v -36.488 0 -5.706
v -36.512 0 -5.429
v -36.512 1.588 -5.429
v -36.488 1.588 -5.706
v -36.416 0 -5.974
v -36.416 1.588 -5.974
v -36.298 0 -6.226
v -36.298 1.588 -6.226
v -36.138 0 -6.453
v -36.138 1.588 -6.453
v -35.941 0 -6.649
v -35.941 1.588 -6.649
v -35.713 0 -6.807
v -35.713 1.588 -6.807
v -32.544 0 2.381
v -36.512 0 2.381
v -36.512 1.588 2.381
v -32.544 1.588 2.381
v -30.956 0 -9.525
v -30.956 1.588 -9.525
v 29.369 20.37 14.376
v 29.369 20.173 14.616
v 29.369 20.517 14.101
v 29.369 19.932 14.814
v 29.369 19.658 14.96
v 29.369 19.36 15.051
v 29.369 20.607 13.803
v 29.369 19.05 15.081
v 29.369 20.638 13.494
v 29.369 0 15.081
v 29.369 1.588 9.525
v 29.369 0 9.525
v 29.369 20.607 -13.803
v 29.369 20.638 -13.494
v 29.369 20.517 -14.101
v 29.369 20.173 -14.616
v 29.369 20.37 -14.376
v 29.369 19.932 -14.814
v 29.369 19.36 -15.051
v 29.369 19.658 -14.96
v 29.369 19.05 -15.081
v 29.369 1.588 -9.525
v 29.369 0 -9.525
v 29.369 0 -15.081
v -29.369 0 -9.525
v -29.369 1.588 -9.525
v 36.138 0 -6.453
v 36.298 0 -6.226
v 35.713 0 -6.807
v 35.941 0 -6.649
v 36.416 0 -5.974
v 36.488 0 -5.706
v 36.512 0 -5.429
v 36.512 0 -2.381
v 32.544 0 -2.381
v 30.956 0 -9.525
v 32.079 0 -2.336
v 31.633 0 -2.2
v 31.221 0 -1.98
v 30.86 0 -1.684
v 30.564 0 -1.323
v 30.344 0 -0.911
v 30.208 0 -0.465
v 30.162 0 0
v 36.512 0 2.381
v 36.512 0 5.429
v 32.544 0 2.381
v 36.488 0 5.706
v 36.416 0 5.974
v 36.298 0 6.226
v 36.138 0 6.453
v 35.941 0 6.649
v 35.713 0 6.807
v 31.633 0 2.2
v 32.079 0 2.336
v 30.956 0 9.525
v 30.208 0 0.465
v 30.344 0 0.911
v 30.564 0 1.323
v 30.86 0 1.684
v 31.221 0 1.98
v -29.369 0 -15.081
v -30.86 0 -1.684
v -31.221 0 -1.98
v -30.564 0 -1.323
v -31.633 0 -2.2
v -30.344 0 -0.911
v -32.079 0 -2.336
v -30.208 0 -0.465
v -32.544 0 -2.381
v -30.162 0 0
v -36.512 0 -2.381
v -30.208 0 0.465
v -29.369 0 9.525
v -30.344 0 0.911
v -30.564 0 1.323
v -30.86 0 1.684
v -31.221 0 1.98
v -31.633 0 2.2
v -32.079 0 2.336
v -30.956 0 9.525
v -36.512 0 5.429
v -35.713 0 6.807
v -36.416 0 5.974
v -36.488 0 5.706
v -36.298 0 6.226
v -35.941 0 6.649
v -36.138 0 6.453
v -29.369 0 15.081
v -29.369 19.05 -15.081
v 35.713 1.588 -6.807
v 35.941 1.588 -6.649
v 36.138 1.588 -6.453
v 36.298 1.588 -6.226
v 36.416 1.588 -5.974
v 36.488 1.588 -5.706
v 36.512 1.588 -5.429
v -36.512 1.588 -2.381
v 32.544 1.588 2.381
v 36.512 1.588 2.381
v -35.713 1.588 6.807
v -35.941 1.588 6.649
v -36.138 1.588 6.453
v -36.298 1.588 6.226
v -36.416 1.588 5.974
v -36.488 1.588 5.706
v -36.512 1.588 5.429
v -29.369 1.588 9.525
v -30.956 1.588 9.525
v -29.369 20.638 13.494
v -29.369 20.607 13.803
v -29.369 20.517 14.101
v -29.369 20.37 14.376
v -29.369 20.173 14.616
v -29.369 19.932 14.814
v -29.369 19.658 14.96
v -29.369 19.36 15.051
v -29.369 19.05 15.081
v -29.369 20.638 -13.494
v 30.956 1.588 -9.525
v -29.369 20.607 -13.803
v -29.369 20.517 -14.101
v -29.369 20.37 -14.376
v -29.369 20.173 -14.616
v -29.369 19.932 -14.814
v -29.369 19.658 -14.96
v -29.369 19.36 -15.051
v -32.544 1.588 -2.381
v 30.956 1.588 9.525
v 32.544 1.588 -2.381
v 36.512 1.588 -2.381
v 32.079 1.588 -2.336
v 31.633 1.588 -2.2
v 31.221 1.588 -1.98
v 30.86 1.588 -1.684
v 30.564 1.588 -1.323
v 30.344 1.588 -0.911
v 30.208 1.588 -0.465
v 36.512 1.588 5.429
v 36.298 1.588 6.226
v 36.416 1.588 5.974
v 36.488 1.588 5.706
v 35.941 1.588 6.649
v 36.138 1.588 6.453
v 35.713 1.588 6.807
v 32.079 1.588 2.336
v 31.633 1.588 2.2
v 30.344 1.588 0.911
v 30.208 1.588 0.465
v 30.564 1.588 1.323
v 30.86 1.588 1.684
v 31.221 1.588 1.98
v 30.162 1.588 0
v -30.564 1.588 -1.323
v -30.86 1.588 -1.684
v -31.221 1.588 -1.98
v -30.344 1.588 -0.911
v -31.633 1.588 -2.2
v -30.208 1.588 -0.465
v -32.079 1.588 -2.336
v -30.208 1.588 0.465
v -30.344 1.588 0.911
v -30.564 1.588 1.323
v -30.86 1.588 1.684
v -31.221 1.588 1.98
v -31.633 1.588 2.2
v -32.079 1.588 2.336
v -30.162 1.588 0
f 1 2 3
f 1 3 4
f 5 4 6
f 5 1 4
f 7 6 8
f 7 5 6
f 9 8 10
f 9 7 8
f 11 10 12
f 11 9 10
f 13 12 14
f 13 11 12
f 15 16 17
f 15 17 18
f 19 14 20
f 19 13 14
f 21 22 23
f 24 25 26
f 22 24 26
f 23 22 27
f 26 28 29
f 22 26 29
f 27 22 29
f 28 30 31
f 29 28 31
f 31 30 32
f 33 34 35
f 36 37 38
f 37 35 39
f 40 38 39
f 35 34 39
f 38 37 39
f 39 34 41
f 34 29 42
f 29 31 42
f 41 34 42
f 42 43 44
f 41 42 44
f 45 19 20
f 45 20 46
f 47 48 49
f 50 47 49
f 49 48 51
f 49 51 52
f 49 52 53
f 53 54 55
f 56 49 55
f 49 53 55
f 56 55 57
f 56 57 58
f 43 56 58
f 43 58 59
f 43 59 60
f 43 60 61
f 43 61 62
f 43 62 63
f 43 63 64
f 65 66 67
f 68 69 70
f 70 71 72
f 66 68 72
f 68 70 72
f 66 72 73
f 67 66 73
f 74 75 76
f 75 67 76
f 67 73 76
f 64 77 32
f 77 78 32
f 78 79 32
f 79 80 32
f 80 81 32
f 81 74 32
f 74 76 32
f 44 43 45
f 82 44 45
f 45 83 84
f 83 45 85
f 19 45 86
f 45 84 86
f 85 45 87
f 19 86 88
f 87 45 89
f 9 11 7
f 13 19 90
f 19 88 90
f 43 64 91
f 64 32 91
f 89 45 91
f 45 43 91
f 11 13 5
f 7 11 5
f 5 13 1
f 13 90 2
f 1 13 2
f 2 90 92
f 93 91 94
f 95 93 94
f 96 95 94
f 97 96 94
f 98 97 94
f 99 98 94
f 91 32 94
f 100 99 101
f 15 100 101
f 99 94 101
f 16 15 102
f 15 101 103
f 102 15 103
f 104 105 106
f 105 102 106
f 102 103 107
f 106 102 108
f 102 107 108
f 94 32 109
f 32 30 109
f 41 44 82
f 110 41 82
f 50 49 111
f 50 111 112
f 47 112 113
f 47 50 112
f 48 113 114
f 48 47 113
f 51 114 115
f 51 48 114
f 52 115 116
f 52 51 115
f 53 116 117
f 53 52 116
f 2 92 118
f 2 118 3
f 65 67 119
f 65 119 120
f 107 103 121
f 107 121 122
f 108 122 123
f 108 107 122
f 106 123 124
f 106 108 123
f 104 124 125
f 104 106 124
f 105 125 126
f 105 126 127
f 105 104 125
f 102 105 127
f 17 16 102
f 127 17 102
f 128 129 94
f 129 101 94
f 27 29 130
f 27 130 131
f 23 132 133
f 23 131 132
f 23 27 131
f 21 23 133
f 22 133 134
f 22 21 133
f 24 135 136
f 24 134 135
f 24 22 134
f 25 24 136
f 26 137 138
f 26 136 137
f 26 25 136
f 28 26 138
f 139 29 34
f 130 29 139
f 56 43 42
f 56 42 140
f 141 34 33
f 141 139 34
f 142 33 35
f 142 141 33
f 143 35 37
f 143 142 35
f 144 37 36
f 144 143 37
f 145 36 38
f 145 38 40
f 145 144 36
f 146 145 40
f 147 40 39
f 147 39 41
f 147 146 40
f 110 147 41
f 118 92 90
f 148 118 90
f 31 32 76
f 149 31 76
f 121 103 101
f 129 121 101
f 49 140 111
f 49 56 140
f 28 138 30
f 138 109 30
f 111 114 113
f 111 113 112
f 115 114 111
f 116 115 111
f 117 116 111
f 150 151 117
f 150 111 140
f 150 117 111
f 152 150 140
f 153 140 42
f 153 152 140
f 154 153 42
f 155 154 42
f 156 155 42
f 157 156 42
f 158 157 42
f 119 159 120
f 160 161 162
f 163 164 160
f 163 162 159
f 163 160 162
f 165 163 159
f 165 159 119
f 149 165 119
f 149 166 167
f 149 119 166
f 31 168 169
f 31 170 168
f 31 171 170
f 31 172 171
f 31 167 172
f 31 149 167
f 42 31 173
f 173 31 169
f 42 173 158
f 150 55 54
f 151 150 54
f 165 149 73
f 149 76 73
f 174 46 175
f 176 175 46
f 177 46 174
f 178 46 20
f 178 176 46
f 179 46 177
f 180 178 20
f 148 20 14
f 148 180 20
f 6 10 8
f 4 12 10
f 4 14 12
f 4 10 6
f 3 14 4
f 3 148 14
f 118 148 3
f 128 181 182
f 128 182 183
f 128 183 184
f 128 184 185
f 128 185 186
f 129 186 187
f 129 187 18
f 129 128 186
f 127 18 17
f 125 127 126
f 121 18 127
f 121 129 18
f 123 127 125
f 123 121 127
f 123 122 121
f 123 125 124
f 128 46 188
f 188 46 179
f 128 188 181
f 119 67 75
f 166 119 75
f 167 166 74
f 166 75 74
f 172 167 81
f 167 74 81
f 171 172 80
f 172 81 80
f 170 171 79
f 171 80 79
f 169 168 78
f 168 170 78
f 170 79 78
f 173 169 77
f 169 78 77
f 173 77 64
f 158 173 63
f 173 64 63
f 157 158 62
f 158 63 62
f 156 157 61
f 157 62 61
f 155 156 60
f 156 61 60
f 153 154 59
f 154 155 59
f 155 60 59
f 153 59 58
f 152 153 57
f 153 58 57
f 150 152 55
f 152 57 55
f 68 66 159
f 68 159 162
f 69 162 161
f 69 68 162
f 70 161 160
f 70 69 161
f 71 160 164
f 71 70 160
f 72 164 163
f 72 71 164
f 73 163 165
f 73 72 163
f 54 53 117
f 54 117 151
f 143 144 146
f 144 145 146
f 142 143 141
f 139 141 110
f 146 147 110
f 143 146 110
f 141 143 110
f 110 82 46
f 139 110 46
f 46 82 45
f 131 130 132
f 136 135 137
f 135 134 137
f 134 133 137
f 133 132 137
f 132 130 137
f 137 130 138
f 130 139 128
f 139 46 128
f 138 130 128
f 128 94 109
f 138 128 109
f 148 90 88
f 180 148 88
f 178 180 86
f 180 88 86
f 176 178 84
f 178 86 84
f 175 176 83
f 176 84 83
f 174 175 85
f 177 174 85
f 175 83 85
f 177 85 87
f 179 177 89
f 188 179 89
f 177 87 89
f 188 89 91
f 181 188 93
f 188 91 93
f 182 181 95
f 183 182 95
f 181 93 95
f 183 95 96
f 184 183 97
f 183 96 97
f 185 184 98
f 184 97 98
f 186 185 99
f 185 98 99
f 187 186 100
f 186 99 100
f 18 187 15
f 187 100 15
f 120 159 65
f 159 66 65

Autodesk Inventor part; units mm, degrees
ref_plane "YZ Plane" through (0, 0, 0) normal (1, 0, 0) x (0, 1, 0)
ref_plane "XZ Plane" through (0, 0, 0) normal (0, 1, 0) x (-1, 0, 0)
ref_plane "XY Plane" through (0, 0, 0) normal (0, 0, 1) x (1, 0, 0)
sketch "Sketch1" plane through (0, 0, 0) normal (0, 1, 0) x (-1, 0, 0)
  line L0 (29.3688, 15.0812) -> (-29.3688, 15.0812)
  line L1 (-29.3688, 15.0812) -> (-29.3688, -15.0812)
  line L2 (-29.3688, -15.0812) -> (29.3688, -15.0812)
  line L3 (29.3688, -15.0812) -> (29.3688, 15.0812)
  line L4 (41.1163, 0) -> (-41.1162, 0) construction
  line L5 (0, -21.1137) -> (0, 21.1137) construction
  point P0 (0, 0)
  point P1 (0, -15.0812)
  point P2 (29.3688, 0)
  dimension "d0" = 58.7375
  dimension "d1" = 30.1625
extrude "Extrusion1" add sketch "Sketch1" along normal blind 20.6375
sketch "Sketch3" plane through (0, 0, 0) normal (0, 1, 0) x (-1, 0, 0)
  line L0 (-29.3688, 15.0812) -> (-29.3688, -15.0812) construction
  line L1 (41.1163, 0) -> (-41.1163, 0) construction
  line L2 (-29.3688, 9.525) -> (-29.3688, -9.525)
  line L3 (-29.3688, -9.525) -> (-30.9563, -9.525)
  line L4 (-30.9563, -9.525) -> (-35.7126, -6.8071)
  arc A0 (-32.5438, -2.3813) -> (-32.5438, 2.3813) centre (-32.5438, 0) ccw
  line L5 (-32.5438, -2.3813) -> (-36.5125, -2.3813)
  line L6 (-36.5125, -5.4287) -> (-36.5125, -2.3813)
  line L7 (-29.3688, 9.525) -> (-30.9563, 9.525)
  line L8 (-30.9563, 9.525) -> (-35.7126, 6.8071)
  line L9 (-32.5438, 2.3813) -> (-36.5125, 2.3813)
  line L10 (-36.5125, 5.4287) -> (-36.5125, 2.3813)
  arc A1 (-36.5125, -5.4287) -> (-35.7126, -6.8071) centre (-34.925, -5.4287) ccw
  arc A2 (-35.7126, 6.8071) -> (-36.5125, 5.4287) centre (-34.925, 5.4287) ccw
  point P0 (0, 0)
  point P1 (-29.3688, 0)
  point P2 (-36.5125, -6.35)
  point P3 (-30.1625, 0)
  point P4 (-36.5125, 6.35)
  dimension "d4" = 19.05
  dimension "d5" = 1.5875
  dimension "d6" = 7.1437
  dimension "d7" = 6.35
  dimension "d9" = 4.7625
  dimension "d10" = 6.35
  dimension "d11" = 1.5875
  dimension "d12" = 1.5875
extrude "Extrusion2" add sketch "Sketch3" along normal blind 1.5875
mirror "Mirror1" about plane through (0, 0, 0) normal (1, 0, 0) of "Extrusion2"
fillet "Fillet1" radius 1.5875 2 edges at (0, 20.6375, 15.0812) (0, 20.6375, -15.0812)
properties part number "Drok-DC-9v+-to-5v-Converter"
